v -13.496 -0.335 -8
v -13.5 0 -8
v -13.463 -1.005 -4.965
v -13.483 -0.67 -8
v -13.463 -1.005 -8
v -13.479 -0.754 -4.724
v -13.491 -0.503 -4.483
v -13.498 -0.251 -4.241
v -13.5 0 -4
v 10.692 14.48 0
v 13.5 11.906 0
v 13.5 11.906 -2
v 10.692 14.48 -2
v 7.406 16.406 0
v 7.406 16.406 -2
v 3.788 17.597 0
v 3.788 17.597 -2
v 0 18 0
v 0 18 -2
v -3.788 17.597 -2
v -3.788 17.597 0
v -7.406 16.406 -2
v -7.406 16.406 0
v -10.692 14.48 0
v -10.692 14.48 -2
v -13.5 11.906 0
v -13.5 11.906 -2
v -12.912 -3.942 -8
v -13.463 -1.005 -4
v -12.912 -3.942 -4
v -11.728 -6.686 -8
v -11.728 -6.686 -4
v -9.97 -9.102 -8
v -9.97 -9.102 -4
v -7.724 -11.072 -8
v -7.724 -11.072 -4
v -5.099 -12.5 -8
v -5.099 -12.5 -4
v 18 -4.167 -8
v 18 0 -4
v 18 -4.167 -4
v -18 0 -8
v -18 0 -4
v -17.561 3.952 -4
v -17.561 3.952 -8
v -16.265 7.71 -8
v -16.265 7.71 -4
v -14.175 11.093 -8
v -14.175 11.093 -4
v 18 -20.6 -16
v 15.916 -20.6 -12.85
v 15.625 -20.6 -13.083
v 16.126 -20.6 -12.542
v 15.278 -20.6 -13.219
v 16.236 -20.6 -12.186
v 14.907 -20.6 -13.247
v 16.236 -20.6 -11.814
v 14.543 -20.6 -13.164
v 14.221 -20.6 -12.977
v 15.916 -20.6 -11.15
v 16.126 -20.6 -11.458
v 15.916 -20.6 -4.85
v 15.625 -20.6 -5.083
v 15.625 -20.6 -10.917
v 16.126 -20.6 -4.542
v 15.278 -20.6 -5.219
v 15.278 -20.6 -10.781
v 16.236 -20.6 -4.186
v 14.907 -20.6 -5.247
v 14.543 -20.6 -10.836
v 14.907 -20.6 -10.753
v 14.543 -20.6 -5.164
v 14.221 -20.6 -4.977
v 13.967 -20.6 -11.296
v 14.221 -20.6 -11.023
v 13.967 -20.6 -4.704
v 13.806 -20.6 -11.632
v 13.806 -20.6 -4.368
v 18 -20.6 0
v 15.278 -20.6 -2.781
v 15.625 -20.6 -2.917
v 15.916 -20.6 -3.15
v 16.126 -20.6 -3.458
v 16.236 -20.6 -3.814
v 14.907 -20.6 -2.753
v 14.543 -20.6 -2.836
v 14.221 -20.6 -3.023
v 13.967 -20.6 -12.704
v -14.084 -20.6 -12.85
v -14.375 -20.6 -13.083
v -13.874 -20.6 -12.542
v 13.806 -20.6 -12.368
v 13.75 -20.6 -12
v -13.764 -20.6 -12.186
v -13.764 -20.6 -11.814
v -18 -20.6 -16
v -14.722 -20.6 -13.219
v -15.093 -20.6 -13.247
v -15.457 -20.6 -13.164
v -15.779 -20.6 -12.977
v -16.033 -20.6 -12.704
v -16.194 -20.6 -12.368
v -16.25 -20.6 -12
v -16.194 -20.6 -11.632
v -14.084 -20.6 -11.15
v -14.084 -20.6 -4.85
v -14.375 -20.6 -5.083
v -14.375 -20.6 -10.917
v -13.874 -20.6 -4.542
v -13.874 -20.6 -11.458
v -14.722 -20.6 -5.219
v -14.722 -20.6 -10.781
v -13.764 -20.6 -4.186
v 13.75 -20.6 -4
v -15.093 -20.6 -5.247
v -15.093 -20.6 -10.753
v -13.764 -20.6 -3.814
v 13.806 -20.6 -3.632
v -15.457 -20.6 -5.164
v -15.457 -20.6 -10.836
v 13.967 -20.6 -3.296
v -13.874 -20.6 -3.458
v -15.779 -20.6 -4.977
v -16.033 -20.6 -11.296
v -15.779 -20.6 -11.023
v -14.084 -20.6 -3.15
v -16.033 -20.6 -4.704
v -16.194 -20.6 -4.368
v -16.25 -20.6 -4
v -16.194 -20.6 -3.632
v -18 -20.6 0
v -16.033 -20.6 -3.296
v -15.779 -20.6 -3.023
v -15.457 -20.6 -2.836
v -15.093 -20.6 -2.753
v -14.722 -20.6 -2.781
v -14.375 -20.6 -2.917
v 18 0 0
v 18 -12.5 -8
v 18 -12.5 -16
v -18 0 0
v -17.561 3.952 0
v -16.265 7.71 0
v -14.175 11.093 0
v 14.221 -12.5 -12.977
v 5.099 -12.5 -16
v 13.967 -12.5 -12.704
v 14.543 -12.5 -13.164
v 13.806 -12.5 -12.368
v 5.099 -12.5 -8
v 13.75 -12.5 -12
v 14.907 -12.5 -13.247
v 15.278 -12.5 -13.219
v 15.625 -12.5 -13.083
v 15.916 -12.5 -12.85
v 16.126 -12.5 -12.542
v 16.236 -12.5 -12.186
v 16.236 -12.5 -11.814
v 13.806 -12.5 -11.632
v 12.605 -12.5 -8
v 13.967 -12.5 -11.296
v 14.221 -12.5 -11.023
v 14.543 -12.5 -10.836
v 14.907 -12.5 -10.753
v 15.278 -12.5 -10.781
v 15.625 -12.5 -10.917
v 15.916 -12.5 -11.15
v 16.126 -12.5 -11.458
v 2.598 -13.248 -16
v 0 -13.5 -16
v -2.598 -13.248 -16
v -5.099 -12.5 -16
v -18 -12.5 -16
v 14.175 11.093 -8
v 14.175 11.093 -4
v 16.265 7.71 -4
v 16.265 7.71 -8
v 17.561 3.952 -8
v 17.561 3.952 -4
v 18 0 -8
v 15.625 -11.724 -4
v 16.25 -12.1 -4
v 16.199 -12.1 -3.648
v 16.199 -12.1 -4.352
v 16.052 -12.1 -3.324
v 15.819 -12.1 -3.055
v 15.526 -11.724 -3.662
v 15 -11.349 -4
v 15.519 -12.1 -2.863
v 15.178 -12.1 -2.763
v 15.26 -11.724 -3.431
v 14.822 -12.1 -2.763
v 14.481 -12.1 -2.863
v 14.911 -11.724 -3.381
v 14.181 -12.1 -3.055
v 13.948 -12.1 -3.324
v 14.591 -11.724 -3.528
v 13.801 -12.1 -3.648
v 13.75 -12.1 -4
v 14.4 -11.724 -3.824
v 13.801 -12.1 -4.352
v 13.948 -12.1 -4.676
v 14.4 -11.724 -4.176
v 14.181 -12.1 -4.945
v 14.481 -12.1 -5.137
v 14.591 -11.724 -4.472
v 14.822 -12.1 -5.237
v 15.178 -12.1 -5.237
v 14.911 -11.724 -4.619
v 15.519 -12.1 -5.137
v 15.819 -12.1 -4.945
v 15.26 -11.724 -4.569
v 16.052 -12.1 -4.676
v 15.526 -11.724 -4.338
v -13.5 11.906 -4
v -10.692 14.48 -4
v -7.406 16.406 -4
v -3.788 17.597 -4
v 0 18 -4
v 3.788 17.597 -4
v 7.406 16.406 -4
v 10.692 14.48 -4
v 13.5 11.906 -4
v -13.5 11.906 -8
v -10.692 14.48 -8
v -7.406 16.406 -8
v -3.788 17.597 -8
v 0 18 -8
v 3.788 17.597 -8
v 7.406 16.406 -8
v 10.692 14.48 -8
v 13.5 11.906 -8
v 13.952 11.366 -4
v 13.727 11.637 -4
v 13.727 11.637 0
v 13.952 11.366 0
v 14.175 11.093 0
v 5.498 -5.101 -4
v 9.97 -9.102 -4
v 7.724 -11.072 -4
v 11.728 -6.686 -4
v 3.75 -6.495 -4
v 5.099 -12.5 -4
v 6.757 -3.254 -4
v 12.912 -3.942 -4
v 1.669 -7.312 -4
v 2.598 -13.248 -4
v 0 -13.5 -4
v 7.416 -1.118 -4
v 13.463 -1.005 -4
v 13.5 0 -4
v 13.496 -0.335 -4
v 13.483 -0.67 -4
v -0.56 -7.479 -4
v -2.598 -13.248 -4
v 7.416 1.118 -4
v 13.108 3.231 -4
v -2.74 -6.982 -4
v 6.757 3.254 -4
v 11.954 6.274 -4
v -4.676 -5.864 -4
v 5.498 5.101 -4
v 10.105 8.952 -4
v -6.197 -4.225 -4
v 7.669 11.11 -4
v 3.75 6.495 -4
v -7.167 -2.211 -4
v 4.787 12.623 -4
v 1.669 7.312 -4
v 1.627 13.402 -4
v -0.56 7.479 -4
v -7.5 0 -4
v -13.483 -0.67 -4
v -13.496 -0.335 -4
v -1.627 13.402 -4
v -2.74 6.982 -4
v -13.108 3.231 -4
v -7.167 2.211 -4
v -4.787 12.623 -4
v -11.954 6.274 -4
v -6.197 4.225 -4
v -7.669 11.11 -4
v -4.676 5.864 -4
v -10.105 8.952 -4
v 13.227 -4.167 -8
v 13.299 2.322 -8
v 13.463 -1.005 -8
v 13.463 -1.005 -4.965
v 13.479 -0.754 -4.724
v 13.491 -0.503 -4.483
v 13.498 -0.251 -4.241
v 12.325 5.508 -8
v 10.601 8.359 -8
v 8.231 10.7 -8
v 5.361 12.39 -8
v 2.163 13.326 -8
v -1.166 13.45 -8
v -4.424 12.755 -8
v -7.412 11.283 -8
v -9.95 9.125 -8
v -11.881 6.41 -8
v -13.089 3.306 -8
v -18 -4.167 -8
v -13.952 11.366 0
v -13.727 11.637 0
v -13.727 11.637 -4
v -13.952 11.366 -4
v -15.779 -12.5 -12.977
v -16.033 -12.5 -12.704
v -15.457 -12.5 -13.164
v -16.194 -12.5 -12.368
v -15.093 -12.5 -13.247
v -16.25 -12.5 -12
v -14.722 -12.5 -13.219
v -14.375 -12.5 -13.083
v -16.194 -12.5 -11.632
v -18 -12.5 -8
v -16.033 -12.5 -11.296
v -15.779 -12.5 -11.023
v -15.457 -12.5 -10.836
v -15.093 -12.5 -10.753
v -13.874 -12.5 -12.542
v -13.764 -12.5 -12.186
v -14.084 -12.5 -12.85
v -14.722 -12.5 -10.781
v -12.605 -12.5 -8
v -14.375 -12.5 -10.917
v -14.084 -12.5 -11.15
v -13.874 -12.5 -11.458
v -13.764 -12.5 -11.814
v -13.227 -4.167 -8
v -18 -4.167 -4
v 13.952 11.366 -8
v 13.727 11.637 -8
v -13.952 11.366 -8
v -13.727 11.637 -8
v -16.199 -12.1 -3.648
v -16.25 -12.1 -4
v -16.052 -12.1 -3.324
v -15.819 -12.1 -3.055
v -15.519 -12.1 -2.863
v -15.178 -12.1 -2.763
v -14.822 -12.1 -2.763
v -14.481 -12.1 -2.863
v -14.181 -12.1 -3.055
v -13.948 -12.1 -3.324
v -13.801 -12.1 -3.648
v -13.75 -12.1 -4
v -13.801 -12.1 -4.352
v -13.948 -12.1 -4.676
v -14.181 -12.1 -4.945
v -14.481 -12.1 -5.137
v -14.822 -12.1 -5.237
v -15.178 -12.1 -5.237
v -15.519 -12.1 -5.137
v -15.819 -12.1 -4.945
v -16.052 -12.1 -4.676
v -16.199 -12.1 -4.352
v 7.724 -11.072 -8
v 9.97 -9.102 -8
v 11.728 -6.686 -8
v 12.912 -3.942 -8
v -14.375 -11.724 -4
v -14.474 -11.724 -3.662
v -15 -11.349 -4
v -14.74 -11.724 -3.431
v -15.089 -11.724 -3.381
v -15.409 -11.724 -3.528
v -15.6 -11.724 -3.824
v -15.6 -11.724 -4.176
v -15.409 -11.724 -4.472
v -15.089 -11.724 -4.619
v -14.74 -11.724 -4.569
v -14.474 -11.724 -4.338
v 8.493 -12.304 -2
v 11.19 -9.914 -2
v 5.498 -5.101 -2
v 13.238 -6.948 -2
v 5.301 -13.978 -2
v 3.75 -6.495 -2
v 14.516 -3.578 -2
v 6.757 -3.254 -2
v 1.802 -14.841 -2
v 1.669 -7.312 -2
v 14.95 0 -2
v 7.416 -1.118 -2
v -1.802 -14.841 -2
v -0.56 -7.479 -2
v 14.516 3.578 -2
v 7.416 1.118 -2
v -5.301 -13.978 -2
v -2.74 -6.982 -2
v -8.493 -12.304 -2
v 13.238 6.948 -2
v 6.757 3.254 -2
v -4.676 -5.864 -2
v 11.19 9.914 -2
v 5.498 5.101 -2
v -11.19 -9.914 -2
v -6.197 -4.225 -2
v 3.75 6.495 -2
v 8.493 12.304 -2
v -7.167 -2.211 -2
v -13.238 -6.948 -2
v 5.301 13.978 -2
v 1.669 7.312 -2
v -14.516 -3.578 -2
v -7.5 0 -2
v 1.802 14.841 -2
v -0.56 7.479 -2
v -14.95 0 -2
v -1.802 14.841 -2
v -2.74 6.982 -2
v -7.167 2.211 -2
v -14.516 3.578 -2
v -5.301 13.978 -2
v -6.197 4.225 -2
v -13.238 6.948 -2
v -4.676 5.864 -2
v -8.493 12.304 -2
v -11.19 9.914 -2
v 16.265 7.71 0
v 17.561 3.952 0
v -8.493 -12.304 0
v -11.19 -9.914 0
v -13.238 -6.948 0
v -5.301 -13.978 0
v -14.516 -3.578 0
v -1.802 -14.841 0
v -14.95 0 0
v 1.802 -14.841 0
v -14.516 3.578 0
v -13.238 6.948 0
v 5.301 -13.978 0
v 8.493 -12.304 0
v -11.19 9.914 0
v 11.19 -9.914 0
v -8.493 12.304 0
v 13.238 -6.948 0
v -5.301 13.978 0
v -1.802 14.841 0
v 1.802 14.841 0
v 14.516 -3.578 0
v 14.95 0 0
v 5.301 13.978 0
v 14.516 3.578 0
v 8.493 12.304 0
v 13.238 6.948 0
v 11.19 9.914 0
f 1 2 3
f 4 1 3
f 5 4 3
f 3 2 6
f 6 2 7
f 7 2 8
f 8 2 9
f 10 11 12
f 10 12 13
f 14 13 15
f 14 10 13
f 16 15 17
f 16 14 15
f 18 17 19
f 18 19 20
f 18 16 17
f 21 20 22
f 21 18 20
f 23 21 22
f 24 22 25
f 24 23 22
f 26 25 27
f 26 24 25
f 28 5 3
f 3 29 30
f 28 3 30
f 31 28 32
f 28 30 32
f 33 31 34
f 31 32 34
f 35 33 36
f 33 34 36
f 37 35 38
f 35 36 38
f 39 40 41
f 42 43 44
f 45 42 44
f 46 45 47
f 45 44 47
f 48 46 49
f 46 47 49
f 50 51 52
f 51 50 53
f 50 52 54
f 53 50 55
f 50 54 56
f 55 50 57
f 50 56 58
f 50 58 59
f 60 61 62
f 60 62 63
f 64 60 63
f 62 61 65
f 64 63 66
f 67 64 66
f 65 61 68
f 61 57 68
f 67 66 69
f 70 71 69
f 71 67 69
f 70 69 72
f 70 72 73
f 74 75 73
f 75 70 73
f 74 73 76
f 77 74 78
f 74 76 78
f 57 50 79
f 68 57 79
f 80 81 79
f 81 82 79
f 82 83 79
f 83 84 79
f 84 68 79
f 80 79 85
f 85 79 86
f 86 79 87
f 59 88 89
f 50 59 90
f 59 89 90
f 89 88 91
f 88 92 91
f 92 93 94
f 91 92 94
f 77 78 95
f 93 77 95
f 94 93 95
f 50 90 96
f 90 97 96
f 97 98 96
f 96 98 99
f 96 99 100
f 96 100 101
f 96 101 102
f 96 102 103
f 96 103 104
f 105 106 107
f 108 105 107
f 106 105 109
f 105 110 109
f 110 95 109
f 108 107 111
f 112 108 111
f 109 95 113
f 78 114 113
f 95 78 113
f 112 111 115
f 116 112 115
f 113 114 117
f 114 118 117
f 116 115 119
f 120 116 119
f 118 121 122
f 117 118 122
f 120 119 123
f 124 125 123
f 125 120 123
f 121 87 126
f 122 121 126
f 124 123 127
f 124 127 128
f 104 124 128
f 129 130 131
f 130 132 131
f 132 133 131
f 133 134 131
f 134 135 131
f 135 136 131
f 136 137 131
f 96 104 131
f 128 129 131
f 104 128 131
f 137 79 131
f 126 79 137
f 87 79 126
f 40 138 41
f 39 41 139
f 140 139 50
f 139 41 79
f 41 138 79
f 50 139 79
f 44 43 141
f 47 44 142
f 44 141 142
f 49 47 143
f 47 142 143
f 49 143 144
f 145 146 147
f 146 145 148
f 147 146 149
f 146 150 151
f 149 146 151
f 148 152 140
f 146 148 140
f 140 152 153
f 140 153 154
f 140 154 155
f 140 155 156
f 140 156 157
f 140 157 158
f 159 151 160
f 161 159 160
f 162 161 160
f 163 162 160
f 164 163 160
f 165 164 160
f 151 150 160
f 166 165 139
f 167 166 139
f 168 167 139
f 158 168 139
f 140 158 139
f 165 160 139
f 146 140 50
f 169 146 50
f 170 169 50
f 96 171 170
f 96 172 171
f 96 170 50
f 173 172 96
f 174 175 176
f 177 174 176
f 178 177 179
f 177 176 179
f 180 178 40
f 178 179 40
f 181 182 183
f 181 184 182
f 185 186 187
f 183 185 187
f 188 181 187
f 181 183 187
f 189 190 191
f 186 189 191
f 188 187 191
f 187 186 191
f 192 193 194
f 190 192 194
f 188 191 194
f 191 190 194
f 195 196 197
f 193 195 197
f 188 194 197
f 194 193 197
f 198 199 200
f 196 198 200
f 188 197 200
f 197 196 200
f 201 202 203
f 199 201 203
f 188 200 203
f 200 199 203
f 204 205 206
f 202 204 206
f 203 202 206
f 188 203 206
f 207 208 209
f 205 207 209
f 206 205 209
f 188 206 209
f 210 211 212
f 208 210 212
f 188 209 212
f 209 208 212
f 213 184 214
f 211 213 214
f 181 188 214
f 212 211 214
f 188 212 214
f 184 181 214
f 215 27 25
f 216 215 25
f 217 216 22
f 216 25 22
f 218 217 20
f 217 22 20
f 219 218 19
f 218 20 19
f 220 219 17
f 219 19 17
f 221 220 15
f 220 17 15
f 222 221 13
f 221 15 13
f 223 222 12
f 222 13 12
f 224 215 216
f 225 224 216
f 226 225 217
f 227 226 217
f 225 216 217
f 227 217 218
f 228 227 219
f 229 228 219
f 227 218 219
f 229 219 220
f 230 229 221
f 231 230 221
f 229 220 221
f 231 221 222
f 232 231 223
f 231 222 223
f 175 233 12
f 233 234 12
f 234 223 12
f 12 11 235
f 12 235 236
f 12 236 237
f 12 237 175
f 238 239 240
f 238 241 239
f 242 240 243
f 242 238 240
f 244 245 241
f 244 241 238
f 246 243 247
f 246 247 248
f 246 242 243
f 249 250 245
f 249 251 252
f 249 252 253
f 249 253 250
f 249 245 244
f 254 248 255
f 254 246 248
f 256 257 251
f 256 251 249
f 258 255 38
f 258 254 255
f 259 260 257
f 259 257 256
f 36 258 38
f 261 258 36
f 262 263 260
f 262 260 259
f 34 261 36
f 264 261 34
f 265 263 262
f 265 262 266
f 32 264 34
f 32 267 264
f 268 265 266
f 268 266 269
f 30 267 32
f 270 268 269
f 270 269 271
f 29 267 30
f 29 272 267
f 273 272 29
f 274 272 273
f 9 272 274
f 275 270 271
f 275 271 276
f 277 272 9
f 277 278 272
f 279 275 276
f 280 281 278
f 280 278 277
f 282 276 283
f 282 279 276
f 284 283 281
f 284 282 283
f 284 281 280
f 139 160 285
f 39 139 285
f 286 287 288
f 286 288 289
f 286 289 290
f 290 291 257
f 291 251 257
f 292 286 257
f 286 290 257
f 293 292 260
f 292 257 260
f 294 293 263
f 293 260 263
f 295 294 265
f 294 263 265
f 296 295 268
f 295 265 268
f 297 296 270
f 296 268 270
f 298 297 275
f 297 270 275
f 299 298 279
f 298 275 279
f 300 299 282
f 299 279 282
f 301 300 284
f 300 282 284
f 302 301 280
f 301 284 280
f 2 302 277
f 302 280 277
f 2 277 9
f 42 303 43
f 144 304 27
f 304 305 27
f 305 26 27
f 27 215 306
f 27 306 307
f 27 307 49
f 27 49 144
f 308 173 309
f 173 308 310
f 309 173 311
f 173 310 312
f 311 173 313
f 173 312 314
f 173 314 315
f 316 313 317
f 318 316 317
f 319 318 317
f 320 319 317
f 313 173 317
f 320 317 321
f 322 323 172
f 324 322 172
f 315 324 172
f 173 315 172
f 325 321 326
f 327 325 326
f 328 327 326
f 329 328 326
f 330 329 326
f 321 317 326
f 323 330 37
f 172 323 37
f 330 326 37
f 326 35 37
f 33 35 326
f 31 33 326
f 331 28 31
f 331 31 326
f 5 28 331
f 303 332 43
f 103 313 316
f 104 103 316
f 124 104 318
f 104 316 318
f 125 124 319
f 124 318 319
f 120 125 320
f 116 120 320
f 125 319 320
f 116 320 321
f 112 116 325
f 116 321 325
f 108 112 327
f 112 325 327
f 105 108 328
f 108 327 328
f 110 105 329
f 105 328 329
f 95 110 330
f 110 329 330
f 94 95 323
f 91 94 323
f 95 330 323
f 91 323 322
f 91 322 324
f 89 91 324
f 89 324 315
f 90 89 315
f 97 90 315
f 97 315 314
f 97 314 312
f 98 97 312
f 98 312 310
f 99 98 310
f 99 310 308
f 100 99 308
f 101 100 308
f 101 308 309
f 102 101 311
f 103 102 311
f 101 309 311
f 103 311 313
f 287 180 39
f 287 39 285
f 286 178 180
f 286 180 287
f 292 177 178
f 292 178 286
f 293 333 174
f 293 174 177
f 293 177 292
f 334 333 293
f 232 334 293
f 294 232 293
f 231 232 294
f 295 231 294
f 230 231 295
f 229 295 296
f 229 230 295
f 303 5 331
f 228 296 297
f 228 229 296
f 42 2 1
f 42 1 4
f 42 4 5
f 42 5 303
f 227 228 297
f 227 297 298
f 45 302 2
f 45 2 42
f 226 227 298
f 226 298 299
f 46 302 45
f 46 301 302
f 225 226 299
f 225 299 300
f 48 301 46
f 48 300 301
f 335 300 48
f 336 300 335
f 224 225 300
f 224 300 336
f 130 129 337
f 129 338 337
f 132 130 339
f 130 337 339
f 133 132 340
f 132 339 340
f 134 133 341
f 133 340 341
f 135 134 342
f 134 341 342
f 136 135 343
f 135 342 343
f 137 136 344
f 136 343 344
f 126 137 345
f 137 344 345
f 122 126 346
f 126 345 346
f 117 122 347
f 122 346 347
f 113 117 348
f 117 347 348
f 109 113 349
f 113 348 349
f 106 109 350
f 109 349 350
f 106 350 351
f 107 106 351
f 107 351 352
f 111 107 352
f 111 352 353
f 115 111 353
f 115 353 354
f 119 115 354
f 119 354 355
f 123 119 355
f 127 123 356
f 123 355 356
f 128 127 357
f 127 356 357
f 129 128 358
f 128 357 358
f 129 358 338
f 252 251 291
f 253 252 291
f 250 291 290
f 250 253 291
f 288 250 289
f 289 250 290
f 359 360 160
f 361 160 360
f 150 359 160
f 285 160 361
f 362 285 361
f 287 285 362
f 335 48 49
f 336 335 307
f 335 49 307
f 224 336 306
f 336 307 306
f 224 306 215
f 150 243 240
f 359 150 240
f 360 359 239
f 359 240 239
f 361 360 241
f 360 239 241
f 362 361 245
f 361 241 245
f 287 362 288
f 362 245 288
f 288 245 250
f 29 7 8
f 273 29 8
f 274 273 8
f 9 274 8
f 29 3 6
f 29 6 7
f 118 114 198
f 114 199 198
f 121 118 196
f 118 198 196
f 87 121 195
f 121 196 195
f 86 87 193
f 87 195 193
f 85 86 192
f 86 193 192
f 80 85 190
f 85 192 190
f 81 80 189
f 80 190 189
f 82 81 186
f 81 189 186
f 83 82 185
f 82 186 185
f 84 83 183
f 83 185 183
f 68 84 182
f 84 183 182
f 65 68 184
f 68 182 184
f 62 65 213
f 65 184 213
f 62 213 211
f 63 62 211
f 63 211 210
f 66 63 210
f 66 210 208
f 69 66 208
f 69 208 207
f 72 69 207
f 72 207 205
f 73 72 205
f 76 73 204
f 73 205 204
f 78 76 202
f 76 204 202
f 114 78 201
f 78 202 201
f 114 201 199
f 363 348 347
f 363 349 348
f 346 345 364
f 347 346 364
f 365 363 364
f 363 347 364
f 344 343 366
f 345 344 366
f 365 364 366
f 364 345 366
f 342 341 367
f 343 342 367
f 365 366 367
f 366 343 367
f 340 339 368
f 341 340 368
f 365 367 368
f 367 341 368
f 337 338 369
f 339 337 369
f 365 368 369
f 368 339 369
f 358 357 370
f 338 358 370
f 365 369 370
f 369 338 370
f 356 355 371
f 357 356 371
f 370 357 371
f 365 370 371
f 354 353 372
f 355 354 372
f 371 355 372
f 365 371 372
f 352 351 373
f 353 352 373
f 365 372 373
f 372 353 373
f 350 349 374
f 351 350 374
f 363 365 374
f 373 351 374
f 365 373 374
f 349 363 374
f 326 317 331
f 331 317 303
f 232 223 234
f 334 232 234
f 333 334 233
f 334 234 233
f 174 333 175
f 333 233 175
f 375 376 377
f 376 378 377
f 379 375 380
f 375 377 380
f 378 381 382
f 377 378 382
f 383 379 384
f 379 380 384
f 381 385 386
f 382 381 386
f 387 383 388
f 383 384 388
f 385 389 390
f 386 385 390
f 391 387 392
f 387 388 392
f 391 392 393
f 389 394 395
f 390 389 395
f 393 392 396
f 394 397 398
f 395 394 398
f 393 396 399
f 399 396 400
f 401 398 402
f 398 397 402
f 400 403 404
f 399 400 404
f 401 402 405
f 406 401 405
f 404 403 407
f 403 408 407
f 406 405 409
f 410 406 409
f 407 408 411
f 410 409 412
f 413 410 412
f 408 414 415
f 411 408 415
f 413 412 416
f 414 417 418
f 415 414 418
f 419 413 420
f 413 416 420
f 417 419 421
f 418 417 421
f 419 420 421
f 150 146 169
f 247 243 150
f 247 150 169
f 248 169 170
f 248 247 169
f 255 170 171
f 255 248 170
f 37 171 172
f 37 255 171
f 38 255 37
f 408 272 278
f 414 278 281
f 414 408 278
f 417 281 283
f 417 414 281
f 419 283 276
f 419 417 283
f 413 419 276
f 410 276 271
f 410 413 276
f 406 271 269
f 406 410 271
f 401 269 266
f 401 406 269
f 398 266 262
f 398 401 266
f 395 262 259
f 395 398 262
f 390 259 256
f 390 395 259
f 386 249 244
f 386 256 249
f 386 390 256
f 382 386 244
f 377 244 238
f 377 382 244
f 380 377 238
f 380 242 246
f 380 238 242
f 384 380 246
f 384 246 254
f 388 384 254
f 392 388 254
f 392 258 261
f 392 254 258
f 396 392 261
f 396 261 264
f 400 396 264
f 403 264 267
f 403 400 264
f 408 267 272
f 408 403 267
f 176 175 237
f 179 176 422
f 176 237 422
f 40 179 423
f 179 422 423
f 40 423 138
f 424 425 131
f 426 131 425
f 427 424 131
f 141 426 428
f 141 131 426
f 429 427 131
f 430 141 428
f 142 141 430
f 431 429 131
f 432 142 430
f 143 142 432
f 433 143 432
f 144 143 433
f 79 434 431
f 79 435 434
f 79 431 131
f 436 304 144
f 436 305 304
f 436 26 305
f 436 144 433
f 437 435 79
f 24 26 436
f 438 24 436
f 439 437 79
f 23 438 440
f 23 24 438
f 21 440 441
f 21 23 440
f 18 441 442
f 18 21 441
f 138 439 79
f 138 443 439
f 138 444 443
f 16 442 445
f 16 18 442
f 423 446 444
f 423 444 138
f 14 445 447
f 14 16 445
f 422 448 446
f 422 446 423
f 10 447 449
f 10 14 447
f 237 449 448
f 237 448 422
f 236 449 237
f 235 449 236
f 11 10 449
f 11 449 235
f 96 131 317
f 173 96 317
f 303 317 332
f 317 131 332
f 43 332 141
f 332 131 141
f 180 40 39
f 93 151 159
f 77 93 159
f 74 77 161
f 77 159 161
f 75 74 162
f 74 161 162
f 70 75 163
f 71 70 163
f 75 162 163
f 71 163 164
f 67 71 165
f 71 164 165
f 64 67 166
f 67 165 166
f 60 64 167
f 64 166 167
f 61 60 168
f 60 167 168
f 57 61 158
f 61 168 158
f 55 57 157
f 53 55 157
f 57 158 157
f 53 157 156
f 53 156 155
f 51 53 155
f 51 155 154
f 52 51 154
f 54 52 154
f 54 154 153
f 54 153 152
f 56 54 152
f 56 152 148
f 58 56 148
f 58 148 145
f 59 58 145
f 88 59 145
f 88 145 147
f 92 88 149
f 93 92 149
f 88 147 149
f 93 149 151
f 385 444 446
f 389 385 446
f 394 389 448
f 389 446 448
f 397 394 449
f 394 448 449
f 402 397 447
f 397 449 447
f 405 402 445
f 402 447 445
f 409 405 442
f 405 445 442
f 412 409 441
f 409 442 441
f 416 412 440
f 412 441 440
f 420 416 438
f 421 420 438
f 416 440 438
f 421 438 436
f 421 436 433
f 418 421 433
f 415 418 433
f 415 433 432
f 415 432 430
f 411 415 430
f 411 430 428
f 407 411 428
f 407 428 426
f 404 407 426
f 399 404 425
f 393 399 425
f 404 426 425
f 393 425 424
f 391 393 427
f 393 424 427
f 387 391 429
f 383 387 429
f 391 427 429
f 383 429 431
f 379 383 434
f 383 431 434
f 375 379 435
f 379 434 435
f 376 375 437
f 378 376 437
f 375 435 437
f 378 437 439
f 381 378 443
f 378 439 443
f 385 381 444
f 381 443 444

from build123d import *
from build123d.topology import SkipClean

# Parameters (mm, degrees)
ESBO_O1_R                     = 18
ESBO_O1_R_2                   = 14.95
RESSALTO_EXTRUS_O1_DEPTH      = 2
ESBO_O16_R                    = 7.5
RESSALTO_EXTRUS_O5_DEPTH      = 2
ESBO_O17_W                    = 48
ESBO_O17_H                    = 12
RESSALTO_EXTRUS_O6_DEPTH      = 8.1
CHANFRO1_SIZE                 = 12
CHANFRO1_SIZE_2               = 12.5
FILETE3_R                     = 44
CORTE_EXTRUS_O11_REACH        = 37.445
CORTE_EXTRUS_O12_REACH        = 31.872
FURO_ROSCADO_DE_M3X0_51_D     = 2.5
FURO_ROSCADO_DE_M3X0_51_DEPTH = 8.5
FURO_ROSCADO_DE_M3X0_51_TIP   = 0.751075774
CORTE_EXTRUS_O13_DEPTH        = 32.691639276
CORTE_EXTRUS_O13_DEPTH_BACK   = 32.691639276
RESSALTO_EXTRUS_O7_DEPTH      = 12
CORTE_EXTRUS_O15_START        = -12
ESBO_O26_R                    = 13.5
CORTE_EXTRUS_O15_DEPTH        = 12
RESSALTO_EXTRUS_O8_START      = -4
RESSALTO_EXTRUS_O8_DEPTH      = 4
RESSALTO_EXTRUS_O9_START      = -4
RESSALTO_EXTRUS_O9_DEPTH      = 4


with BuildPart() as part:
    # Esboço1 → Ressalto-extrusão1 (new body)
    # profile 1 of 2: a face of its own
    with BuildSketch(Plane.XY):
        Circle(ESBO_O1_R)
        Circle(ESBO_O1_R_2, mode=Mode.SUBTRACT)
    # profile 2 of 2: a face of its own
    with BuildSketch(Plane.XY):
        with BuildLine():
            Line((24, -20.6), (24, 0))
            Line((24, 0), (13.5, 11.9058809))
            ThreePointArc((13.5, 11.9058809), (16.83745824, 6.363961031), (18, 0))
            ThreePointArc((18, 0), (-6.363961031, -16.83745824), (-13.5, 11.9058809))
            Line((-13.5, 11.9058809), (-24, 0))
            Line((-24, 0), (-24, -20.6))
            Line((-24, -20.6), (-18, -20.6))
            Line((-18, -20.6), (18, -20.6))
            Line((18, -20.6), (24, -20.6))
        make_face()
    extrude(amount=-RESSALTO_EXTRUS_O1_DEPTH)

    # Esboço16 → Ressalto-extrusão5 (add)
    with BuildSketch(Plane(origin=(0, 0, -2), x_dir=(-1, 0, 0), z_dir=(0, 0, -1))):
        with BuildLine():
            Line((-13.5, 11.9058809), (-24, 0))
            Line((-24, 0), (-24, -20.6))
            Line((-24, -20.6), (24, -20.6))
            Line((24, -20.6), (24, 0))
            Line((24, 0), (13.5, 11.9058809))
            ThreePointArc((13.5, 11.9058809), (0, 18), (-13.5, 11.9058809))
        make_face()
        Circle(ESBO_O16_R, mode=Mode.SUBTRACT)
    extrude(amount=RESSALTO_EXTRUS_O5_DEPTH)

    # Esboço17 → Ressalto-extrusão6 (add)
    with BuildSketch(Plane.XZ.offset(20.6)):
        with Locations((0, -10)):
            Rectangle(ESBO_O17_W, ESBO_O17_H)
    extrude(amount=-RESSALTO_EXTRUS_O6_DEPTH)

    # Chanfro1
    # the kernel refuses this chamfer: 12.5, 12 mm, written as the material it adds along each edge
    with BuildSketch(Plane(origin=(-24, -12.5, -4), x_dir=(0, 0, -1), z_dir=(1, 0, 0))) as chanfro1_piece_1_section:
        Polygon((CHANFRO1_SIZE, 0), (0, CHANFRO1_SIZE_2), (0, 0), align=None)
    chanfro1_piece_1 = extrude(amount=48, mode=Mode.PRIVATE)
    chanfro1_piece_1 = split(chanfro1_piece_1, bisect_by=Plane(origin=(-24, -12.5, -16), z_dir=(0, 0, 1)), keep=Keep.TOP, mode=Mode.PRIVATE)
    chanfro1_piece_1 = split(chanfro1_piece_1, bisect_by=Plane(origin=(9.200979635, 16.7805118, -4), z_dir=(-0.7499999999999999, -0.6614378277661479, 0)), keep=Keep.TOP, mode=Mode.PRIVATE)
    chanfro1_piece_1 = chanfro1_piece_1 - Plane(origin=(0, 0, -4), x_dir=(-1, 0, 0), z_dir=(0, 0, 1)) * Cylinder(7.5, 146, mode=Mode.PRIVATE)
    add(chanfro1_piece_1)

    # Filete3
    # the kernel refuses this fillet: 44 mm, written as the material it takes off along each edge
    with BuildSketch(Plane(origin=(-24, 0, -45.551056879), x_dir=(0, -1, 0), z_dir=(0, 0, 1))) as filete3_piece_1:
        with BuildLine():
            CenterArc((16.620422751, 44), FILETE3_R, 229.584560979, 40.415439021)
            Line((-11.9058809, 10.5), (0, 0))
            Line((0, 0), (16.620422751, 0))
        make_face()
    extrude(amount=87.102113757, mode=Mode.SUBTRACT)
    with BuildSketch(Plane(origin=(24, 0, 41.551056879), x_dir=(-0.6614378277661485, 0.7499999999999993, -1.154178375495321e-15), z_dir=(0, 0, -1))) as filete3_piece_2:
        with BuildLine():
            CenterArc((16.637947358, -43.993376321), FILETE3_R, 90.994183088, 40.415439021)
            Line((-12.465317064, -10.993376321), (0, 0))
            Line((0, 0), (15.874507866, 0))
        make_face()
    extrude(amount=87.102113757, mode=Mode.SUBTRACT)

    # Esboço18 → Corte-extrusão11 (cut, up to next)
    with BuildSketch(Plane.XY, mode=Mode.PRIVATE) as corte_extrus_o11_sk1:
        with BuildLine():
            Line((18, 0), (18, -20.6))
            Line((18, -20.6), (24, -20.6))
            Line((24, -20.6), (24, -16.620422751))
            ThreePointArc((24, -16.620422751), (21.471204393, -1.918749165), (14.175490626, 11.093036803))
            ThreePointArc((14.175490626, 11.093036803), (17.017033103, 5.86690586), (18, 0))
        make_face()
    corte_extrus_o11_tool1 = extrude(corte_extrus_o11_sk1.sketch, amount=-CORTE_EXTRUS_O11_REACH, mode=Mode.PRIVATE) & part.part
    # Esboço18 → Corte-extrusão11 (cut, up to next)
    with BuildSketch(Plane.XY, mode=Mode.PRIVATE) as corte_extrus_o11_sk2:
        with BuildLine():
            Line((-18, -20.6), (-18, 0))
            ThreePointArc((-18, 0), (-17.017033103, 5.86690586), (-14.175490626, 11.093036803))
            ThreePointArc((-14.175490626, 11.093036803), (-21.471204393, -1.918749165), (-24, -16.620422751))
            Line((-24, -16.620422751), (-24, -20.6))
            Line((-24, -20.6), (-18, -20.6))
        make_face()
    corte_extrus_o11_tool2 = extrude(corte_extrus_o11_sk2.sketch, amount=-CORTE_EXTRUS_O11_REACH, mode=Mode.PRIVATE) & part.part
    add(corte_extrus_o11_tool1.solids().sort_by_distance((20.438878, -9.921074, 0))[0], mode=Mode.SUBTRACT)
    add(corte_extrus_o11_tool2.solids().sort_by_distance((-20.438878, -9.921074, 0))[0], mode=Mode.SUBTRACT)

    # Esboço19 → Corte-extrusão12 (cut, up to next)
    with BuildSketch(Plane(origin=(0, 0, -4), x_dir=(-1, 0, 0), z_dir=(0, 0, -1)), mode=Mode.PRIVATE) as corte_extrus_o12_sk1:
        with BuildLine():
            Line((12, -20.6), (13.462552863, -1.004823575))
            ThreePointArc((13.462552863, -1.004823575), (0, 13.5), (-13.462552863, -1.004823575))
            Line((-13.462552863, -1.004823575), (-12, -20.6))
            Line((-12, -20.6), (12, -20.6))
        make_face()
    corte_extrus_o12_tool1 = extrude(corte_extrus_o12_sk1.sketch, amount=CORTE_EXTRUS_O12_REACH, mode=Mode.PRIVATE) & part.part
    add(corte_extrus_o12_tool1.solids().sort_by_distance((0, -4.517343, -4))[0], mode=Mode.SUBTRACT)

    # Furo roscado de M3x0.51
    with Locations(Plane.XZ.offset(20.6)):
        with Locations((-15, -12), (-15, -4), (15, -4), (15, -12)):
            Hole(FURO_ROSCADO_DE_M3X0_51_D / 2, depth=FURO_ROSCADO_DE_M3X0_51_DEPTH)
            with Locations((0, 0, -(FURO_ROSCADO_DE_M3X0_51_DEPTH + FURO_ROSCADO_DE_M3X0_51_TIP / 2))):  # 118° drill point
                Cone(0, FURO_ROSCADO_DE_M3X0_51_D / 2, FURO_ROSCADO_DE_M3X0_51_TIP, mode=Mode.SUBTRACT)

    # Esboço23 → Corte-extrusão13 (cut, two sides: drawn at the far end of the back side and taken through both)
    with BuildSketch(Plane(origin=(0, 0, 0), x_dir=(0, 0, -1), z_dir=(1, 0, 0)).offset(-CORTE_EXTRUS_O13_DEPTH_BACK)):
        Polygon((16, -12.5), (8, -12.5), (8, -4.166666667), align=None)
    extrude(amount=CORTE_EXTRUS_O13_DEPTH + CORTE_EXTRUS_O13_DEPTH_BACK, mode=Mode.SUBTRACT)

    # Esboço24 → Ressalto-extrusão7 (add)
    with BuildSketch(Plane(origin=(0, 0, -4), x_dir=(-1, 0, 0), z_dir=(0, 0, -1))):
        Polygon((-12, -20.6), (12, -20.6), (12.604571142, -12.5), (-12.604571142, -12.5), align=None)
    extrude(amount=RESSALTO_EXTRUS_O7_DEPTH)

    # Esboço26 → Corte-extrusão15 (cut)
    with BuildSketch(Plane(origin=(0, 0, -16), x_dir=(-1, 0, 0), z_dir=(0, 0, -1)).offset(CORTE_EXTRUS_O15_START)):
        Circle(ESBO_O26_R)
    extrude(amount=CORTE_EXTRUS_O15_DEPTH, mode=Mode.SUBTRACT)

    # Esboço27 → Ressalto-extrusão8 (add)
    with SkipClean():  # the faces are left unmerged after this step: merging them gives an invalid solid
        with BuildSketch(Plane(origin=(0, 0, -8), x_dir=(-1, 0, 0), z_dir=(0, 0, -1)).offset(RESSALTO_EXTRUS_O8_START)):
            with BuildLine():
                Line((-12.604571142, -12.5), (-5.099019514, -12.5))
                ThreePointArc((-5.099019514, -12.5), (-10.916398789, -7.942432717), (-13.462552863, -1.004823575))
                Line((-13.462552863, -1.004823575), (-13.226557914, -4.166666667))
                Line((-13.226557914, -4.166666667), (-12.604571142, -12.5))
            make_face()
            with BuildLine():
                Line((5.099019514, -12.5), (12.604571142, -12.5))
                Line((12.604571142, -12.5), (13.462552863, -1.004823575))
                ThreePointArc((13.462552863, -1.004823575), (10.916398789, -7.942432717), (5.099019514, -12.5))
            make_face()
        extrude(amount=RESSALTO_EXTRUS_O8_DEPTH)

    # Esboço28 → Ressalto-extrusão9 (add)
    with SkipClean():  # the faces are left unmerged after this step: merging them gives an invalid solid
        with BuildSketch(Plane(origin=(0, 0, -8), x_dir=(-1, 0, 0), z_dir=(0, 0, -1)).offset(RESSALTO_EXTRUS_O9_START)):
            with BuildLine():
                Line((13.462552863, -1.004823575), (13.226557914, -4.166666667))
                Line((13.226557914, -4.166666667), (18, -4.166666667))
                Line((18, -4.166666667), (18, 0))
                ThreePointArc((18, 0), (17.017033103, 5.86690586), (14.175490626, 11.093036803))
                ThreePointArc((14.175490626, 11.093036803), (13.840185974, 11.501487092), (13.5, 11.9058809))
                ThreePointArc((13.5, 11.9058809), (0, 18), (-13.5, 11.9058809))
                ThreePointArc((-13.5, 11.9058809), (-13.840185974, 11.501487092), (-14.175490626, 11.093036803))
                ThreePointArc((-14.175490626, 11.093036803), (-17.017033103, 5.86690586), (-18, 0))
                Line((-18, 0), (-18, -4.166666667))
                Line((-18, -4.166666667), (-13.226557914, -4.166666667))
                Line((-13.226557914, -4.166666667), (-13.462552863, -1.004823575))
                ThreePointArc((-13.462552863, -1.004823575), (-0.502760556, 13.490634967), (13.5, 0))
                ThreePointArc((13.5, 0), (13.490634967, -0.502760556), (13.462552863, -1.004823575))
            make_face()
        extrude(amount=RESSALTO_EXTRUS_O9_DEPTH)


solid = part.part
